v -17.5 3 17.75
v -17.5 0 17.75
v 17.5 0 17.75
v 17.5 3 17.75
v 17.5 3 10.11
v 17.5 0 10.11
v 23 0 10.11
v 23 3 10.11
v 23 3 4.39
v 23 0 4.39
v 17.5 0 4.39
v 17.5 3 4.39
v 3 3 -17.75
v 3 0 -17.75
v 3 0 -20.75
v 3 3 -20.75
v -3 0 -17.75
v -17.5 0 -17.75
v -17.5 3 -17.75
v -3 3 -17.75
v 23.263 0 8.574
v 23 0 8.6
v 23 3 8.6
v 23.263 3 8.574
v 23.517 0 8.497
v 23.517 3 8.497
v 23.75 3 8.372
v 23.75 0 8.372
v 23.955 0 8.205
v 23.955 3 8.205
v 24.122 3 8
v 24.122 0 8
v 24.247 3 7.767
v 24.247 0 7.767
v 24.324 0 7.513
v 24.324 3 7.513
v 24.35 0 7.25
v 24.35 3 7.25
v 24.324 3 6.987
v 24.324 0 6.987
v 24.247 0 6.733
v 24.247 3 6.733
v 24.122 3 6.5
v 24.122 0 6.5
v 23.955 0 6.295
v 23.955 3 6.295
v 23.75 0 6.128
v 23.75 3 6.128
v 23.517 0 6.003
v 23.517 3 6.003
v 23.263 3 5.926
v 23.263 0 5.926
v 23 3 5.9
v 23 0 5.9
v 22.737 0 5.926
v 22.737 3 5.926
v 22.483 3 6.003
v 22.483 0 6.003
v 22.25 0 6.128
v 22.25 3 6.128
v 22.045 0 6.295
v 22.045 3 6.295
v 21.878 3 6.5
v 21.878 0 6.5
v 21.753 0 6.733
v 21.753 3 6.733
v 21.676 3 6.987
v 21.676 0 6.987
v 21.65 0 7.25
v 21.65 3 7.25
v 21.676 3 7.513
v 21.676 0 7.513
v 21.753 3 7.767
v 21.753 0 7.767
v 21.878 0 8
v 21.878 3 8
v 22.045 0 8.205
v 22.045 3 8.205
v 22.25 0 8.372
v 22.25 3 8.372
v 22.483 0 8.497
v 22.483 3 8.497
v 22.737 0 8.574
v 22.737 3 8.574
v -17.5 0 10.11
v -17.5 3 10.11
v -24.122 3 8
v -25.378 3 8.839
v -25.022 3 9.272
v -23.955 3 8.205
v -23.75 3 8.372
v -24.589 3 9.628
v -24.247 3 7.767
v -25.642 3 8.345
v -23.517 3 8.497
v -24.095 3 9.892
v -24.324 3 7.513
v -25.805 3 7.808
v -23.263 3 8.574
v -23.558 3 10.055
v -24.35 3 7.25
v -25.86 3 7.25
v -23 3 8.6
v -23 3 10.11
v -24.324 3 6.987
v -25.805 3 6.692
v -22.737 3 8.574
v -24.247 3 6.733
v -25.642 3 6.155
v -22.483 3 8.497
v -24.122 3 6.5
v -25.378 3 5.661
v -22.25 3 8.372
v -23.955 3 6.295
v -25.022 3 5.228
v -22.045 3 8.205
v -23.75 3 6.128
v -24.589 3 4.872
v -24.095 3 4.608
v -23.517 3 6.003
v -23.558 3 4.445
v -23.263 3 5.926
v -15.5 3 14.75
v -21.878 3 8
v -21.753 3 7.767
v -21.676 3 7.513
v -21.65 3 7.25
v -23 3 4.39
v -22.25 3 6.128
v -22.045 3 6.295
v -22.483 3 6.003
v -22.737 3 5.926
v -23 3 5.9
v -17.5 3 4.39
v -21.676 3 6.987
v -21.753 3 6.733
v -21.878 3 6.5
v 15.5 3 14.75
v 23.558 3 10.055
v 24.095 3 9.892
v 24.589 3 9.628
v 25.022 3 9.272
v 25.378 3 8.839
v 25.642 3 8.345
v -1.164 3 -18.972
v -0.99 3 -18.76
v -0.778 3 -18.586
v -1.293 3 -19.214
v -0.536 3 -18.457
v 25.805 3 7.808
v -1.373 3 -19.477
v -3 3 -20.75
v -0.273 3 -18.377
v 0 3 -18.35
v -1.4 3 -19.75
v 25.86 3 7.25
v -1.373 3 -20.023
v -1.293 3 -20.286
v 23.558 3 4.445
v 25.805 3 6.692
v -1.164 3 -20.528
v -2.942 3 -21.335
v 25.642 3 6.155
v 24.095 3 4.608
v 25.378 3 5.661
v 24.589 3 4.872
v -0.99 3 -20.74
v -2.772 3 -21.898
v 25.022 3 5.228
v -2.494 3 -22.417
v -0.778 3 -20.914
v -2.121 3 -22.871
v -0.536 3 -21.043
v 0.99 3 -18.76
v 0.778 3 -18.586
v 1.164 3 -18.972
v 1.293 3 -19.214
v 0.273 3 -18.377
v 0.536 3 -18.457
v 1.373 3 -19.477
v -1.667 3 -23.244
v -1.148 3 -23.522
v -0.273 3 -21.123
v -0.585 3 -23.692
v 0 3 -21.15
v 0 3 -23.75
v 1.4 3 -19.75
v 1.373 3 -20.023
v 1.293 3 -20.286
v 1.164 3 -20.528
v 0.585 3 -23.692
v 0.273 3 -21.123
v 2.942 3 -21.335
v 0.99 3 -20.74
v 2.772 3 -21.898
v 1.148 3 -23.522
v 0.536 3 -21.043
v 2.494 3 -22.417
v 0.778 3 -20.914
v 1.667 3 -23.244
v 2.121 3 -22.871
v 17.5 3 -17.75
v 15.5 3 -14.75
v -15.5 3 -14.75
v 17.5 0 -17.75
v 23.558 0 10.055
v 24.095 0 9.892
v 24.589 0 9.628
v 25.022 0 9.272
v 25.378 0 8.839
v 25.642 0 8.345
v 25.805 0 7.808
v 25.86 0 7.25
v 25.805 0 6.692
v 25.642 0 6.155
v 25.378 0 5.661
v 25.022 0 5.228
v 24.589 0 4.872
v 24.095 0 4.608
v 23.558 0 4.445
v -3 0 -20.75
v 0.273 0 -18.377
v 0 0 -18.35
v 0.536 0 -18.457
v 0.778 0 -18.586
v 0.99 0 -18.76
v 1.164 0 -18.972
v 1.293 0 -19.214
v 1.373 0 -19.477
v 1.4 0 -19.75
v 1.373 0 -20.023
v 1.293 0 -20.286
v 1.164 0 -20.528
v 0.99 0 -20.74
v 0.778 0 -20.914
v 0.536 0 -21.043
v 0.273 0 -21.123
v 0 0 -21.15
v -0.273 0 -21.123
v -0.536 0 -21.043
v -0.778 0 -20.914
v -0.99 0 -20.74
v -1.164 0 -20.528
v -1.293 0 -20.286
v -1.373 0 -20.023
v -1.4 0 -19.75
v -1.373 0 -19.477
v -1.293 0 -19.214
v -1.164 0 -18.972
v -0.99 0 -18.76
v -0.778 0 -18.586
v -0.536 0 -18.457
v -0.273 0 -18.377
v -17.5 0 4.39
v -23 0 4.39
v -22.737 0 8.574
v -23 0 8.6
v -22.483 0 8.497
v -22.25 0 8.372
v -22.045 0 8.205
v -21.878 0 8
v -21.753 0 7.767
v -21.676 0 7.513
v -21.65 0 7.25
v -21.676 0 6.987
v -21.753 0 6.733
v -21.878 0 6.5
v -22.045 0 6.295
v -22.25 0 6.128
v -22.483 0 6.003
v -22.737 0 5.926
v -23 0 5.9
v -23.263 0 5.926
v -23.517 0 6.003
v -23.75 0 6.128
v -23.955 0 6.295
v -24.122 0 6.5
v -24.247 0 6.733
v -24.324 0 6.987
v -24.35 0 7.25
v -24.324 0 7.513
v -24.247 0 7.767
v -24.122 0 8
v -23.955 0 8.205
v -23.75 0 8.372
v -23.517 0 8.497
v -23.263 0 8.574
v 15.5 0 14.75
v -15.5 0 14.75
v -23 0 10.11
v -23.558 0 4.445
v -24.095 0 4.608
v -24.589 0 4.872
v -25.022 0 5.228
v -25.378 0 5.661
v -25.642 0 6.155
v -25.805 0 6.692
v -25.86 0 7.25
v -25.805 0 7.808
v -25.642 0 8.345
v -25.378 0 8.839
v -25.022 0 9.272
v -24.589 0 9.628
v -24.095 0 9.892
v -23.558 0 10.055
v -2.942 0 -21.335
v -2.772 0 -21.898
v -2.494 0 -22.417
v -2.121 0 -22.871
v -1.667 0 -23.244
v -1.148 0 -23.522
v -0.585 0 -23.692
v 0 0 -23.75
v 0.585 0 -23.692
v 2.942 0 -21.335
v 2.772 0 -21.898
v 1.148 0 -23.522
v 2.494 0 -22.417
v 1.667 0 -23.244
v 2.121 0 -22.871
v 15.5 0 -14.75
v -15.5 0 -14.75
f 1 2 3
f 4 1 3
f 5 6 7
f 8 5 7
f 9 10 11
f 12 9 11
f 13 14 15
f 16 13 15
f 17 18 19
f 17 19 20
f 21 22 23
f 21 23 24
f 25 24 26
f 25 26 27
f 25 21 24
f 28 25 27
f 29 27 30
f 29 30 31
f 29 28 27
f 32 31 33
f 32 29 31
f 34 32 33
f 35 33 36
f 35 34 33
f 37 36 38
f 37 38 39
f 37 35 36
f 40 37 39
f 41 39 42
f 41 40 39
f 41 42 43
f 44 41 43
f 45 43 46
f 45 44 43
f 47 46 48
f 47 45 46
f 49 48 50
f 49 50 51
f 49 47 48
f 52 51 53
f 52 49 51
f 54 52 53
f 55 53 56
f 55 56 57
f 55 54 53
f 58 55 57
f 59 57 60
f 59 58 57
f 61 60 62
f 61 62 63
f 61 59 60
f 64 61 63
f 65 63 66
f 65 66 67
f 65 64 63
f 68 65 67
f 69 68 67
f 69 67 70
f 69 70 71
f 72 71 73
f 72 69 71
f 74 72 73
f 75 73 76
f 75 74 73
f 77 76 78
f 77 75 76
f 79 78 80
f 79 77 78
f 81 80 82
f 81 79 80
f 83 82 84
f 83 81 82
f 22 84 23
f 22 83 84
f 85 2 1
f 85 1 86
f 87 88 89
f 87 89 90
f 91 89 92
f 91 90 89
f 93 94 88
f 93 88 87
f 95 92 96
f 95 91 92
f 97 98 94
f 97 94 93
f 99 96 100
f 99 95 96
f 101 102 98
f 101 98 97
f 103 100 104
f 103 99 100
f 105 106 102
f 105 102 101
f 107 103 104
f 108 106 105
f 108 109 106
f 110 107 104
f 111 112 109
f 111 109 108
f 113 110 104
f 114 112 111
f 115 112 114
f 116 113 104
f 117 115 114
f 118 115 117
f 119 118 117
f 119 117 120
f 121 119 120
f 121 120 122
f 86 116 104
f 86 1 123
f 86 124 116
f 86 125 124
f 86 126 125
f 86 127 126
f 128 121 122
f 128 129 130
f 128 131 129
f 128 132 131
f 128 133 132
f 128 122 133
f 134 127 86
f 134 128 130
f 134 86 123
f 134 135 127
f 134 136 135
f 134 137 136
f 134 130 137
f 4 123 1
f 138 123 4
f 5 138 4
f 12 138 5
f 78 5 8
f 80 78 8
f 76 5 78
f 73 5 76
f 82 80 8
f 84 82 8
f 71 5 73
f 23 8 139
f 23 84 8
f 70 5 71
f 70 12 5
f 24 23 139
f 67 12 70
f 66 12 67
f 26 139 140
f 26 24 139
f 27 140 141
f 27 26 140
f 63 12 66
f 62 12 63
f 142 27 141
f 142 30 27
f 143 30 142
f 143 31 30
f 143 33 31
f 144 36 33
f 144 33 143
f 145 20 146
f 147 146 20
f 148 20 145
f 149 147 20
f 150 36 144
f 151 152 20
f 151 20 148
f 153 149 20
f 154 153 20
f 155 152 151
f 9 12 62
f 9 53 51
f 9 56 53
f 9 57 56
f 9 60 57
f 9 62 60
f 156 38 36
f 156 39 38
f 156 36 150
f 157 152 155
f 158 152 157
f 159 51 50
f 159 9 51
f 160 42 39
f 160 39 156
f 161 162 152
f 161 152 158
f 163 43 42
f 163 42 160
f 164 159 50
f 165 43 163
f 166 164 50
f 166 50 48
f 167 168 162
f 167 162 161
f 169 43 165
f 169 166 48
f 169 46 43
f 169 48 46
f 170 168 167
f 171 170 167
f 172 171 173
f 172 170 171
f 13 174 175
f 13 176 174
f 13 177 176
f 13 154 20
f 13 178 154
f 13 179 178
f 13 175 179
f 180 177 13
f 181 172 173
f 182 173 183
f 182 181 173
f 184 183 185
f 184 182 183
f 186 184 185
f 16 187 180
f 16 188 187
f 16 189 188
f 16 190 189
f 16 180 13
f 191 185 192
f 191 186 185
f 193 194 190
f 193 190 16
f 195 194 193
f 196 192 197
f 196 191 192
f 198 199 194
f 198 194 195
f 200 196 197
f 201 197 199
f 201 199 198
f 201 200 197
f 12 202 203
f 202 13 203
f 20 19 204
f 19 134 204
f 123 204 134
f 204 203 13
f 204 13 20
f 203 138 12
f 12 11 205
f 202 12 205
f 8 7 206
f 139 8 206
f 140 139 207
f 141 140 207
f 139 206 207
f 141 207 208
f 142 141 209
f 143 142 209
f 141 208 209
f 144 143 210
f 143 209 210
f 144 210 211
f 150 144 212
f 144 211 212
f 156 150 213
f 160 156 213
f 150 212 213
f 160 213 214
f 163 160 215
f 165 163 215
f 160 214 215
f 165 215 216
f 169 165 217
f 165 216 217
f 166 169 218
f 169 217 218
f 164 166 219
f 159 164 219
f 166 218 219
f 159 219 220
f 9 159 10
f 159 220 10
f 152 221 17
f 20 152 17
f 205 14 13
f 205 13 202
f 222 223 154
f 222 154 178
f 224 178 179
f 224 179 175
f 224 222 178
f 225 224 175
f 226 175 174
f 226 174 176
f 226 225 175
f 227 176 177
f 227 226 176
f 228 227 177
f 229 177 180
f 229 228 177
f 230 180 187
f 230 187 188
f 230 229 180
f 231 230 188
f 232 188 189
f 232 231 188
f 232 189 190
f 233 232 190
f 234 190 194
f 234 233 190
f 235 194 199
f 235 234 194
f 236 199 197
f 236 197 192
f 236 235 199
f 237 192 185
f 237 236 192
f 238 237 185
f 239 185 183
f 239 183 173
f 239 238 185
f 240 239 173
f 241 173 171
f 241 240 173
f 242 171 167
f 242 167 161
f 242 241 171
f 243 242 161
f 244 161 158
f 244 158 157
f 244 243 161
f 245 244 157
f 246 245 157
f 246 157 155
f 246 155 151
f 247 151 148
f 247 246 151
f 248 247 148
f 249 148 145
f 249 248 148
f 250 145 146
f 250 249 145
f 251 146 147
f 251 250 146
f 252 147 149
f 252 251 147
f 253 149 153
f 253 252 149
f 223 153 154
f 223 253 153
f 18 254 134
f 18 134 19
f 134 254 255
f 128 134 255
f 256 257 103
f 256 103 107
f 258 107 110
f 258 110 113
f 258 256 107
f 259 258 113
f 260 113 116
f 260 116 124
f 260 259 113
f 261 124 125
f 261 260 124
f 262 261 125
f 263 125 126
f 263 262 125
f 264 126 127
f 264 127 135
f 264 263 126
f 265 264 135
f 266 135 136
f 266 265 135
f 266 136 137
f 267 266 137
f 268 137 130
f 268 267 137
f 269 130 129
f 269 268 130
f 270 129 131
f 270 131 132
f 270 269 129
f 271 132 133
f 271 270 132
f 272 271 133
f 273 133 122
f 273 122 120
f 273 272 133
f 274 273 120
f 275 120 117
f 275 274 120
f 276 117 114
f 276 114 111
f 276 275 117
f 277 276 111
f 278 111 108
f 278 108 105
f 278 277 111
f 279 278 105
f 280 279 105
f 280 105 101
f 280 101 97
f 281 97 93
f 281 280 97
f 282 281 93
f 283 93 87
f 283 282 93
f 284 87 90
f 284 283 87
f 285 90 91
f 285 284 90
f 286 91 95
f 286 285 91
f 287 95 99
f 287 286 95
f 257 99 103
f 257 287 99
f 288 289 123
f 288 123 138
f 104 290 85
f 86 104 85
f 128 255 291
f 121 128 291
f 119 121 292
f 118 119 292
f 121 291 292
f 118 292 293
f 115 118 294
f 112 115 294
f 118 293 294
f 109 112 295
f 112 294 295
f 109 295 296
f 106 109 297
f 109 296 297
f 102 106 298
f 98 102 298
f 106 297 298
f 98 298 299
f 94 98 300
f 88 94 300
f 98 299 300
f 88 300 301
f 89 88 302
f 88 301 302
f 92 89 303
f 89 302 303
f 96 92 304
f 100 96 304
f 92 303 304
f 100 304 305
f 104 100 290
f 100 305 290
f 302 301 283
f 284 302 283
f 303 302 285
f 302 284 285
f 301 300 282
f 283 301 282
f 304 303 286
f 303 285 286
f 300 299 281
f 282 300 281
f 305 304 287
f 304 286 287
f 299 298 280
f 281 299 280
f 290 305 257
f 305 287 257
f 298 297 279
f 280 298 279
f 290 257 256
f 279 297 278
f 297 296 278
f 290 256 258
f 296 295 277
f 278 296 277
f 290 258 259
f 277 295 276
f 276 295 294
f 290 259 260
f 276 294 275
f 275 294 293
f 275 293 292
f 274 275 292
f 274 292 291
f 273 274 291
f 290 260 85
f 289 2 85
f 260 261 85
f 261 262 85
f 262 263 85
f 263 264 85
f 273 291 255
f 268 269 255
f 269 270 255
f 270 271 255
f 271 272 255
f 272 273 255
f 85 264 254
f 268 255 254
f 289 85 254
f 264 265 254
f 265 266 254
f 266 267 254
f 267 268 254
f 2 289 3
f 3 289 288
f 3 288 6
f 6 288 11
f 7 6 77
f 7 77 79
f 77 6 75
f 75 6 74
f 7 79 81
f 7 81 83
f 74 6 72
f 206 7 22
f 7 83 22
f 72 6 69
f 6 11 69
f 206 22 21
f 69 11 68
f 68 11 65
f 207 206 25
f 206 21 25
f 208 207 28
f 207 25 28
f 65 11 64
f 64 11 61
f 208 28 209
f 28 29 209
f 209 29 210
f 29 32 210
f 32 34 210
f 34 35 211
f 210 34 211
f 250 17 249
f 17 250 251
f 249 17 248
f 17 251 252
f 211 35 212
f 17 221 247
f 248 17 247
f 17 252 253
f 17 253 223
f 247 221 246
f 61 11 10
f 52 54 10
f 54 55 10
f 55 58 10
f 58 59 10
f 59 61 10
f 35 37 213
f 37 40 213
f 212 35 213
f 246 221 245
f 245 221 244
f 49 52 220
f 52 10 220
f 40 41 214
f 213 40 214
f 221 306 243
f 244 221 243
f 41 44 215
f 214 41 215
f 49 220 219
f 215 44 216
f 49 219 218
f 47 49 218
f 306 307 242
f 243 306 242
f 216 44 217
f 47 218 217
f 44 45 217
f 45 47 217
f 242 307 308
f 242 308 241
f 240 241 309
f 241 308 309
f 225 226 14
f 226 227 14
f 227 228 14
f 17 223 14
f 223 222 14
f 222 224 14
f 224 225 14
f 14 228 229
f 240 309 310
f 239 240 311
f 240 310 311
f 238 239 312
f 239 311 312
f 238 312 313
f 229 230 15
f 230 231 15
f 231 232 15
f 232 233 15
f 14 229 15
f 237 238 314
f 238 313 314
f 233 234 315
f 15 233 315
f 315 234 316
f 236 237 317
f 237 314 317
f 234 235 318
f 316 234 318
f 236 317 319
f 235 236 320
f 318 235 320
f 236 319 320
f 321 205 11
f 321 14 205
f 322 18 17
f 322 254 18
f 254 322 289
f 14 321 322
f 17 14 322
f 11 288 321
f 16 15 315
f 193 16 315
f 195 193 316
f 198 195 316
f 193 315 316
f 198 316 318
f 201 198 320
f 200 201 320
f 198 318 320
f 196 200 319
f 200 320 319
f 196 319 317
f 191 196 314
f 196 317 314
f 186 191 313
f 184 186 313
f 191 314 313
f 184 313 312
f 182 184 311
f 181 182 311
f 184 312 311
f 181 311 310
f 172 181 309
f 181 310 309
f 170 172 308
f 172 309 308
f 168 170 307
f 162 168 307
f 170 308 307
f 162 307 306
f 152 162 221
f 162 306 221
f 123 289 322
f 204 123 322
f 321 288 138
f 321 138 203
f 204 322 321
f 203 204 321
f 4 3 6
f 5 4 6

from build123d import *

# Parameters (mm, degrees)
SKETCH1_R           = 1.35
SKETCH1_W           = 35
SKETCH1_H           = 35.5
SKETCH1_W_2         = 31
SKETCH1_H_2         = 29.5
SKETCH1_R_2         = 1.4
BOSS_EXTRUDE3_DEPTH = 3


with BuildPart() as part:
    # Sketch1 → Boss-Extrude3 (new body)
    # profile 1 of 4: a face of its own
    with BuildSketch(Plane(origin=(0, 0, 0), x_dir=(1, 0, 0), z_dir=(0, 1, 0))):
        with BuildLine():
            Line((-17.5, -10.110115741), (-17.5, -4.389884259))
            Line((-17.5, -4.389884259), (-23, -4.389884259))
            ThreePointArc((-23, -4.389884259), (-25.860115741, -7.25), (-23, -10.110115741))
            Line((-23, -10.110115741), (-17.5, -10.110115741))
        make_face()
        with Locations(Location((-23, -7.25, 0), (0, 0, 270))):
            Circle(SKETCH1_R, mode=Mode.SUBTRACT)
    # profile 2 of 4: a face of its own
    with BuildSketch(Plane(origin=(0, 0, 0), x_dir=(1, 0, 0), z_dir=(0, 1, 0))):
        Rectangle(SKETCH1_W, SKETCH1_H)
        Rectangle(SKETCH1_W_2, SKETCH1_H_2, mode=Mode.SUBTRACT)
    # profile 3 of 4: a face of its own
    with BuildSketch(Plane(origin=(0, 0, 0), x_dir=(1, 0, 0), z_dir=(0, 1, 0))):
        with BuildLine():
            Line((23, -4.389884259), (17.5, -4.389884259))
            Line((17.5, -4.389884259), (17.5, -10.110115741))
            Line((17.5, -10.110115741), (23, -10.110115741))
            ThreePointArc((23, -10.110115741), (25.860115741, -7.25), (23, -4.389884259))
        make_face()
        with Locations(Location((23, -7.25, 0), (0, 0, 270))):
            Circle(SKETCH1_R, mode=Mode.SUBTRACT)
    # profile 4 of 4: a face of its own
    with BuildSketch(Plane(origin=(0, 0, 0), x_dir=(1, 0, 0), z_dir=(0, 1, 0))):
        with BuildLine():
            Line((-3, 20.75), (-3, 17.75))
            Line((-3, 17.75), (3, 17.75))
            Line((3, 17.75), (3, 20.75))
            ThreePointArc((3, 20.75), (0, 23.75), (-3, 20.75))
        make_face()
        with Locations(Location((0, 19.75, 0), (0, 0, 270))):
            Circle(SKETCH1_R_2, mode=Mode.SUBTRACT)
    extrude(amount=BOSS_EXTRUDE3_DEPTH)


solid = part.part
